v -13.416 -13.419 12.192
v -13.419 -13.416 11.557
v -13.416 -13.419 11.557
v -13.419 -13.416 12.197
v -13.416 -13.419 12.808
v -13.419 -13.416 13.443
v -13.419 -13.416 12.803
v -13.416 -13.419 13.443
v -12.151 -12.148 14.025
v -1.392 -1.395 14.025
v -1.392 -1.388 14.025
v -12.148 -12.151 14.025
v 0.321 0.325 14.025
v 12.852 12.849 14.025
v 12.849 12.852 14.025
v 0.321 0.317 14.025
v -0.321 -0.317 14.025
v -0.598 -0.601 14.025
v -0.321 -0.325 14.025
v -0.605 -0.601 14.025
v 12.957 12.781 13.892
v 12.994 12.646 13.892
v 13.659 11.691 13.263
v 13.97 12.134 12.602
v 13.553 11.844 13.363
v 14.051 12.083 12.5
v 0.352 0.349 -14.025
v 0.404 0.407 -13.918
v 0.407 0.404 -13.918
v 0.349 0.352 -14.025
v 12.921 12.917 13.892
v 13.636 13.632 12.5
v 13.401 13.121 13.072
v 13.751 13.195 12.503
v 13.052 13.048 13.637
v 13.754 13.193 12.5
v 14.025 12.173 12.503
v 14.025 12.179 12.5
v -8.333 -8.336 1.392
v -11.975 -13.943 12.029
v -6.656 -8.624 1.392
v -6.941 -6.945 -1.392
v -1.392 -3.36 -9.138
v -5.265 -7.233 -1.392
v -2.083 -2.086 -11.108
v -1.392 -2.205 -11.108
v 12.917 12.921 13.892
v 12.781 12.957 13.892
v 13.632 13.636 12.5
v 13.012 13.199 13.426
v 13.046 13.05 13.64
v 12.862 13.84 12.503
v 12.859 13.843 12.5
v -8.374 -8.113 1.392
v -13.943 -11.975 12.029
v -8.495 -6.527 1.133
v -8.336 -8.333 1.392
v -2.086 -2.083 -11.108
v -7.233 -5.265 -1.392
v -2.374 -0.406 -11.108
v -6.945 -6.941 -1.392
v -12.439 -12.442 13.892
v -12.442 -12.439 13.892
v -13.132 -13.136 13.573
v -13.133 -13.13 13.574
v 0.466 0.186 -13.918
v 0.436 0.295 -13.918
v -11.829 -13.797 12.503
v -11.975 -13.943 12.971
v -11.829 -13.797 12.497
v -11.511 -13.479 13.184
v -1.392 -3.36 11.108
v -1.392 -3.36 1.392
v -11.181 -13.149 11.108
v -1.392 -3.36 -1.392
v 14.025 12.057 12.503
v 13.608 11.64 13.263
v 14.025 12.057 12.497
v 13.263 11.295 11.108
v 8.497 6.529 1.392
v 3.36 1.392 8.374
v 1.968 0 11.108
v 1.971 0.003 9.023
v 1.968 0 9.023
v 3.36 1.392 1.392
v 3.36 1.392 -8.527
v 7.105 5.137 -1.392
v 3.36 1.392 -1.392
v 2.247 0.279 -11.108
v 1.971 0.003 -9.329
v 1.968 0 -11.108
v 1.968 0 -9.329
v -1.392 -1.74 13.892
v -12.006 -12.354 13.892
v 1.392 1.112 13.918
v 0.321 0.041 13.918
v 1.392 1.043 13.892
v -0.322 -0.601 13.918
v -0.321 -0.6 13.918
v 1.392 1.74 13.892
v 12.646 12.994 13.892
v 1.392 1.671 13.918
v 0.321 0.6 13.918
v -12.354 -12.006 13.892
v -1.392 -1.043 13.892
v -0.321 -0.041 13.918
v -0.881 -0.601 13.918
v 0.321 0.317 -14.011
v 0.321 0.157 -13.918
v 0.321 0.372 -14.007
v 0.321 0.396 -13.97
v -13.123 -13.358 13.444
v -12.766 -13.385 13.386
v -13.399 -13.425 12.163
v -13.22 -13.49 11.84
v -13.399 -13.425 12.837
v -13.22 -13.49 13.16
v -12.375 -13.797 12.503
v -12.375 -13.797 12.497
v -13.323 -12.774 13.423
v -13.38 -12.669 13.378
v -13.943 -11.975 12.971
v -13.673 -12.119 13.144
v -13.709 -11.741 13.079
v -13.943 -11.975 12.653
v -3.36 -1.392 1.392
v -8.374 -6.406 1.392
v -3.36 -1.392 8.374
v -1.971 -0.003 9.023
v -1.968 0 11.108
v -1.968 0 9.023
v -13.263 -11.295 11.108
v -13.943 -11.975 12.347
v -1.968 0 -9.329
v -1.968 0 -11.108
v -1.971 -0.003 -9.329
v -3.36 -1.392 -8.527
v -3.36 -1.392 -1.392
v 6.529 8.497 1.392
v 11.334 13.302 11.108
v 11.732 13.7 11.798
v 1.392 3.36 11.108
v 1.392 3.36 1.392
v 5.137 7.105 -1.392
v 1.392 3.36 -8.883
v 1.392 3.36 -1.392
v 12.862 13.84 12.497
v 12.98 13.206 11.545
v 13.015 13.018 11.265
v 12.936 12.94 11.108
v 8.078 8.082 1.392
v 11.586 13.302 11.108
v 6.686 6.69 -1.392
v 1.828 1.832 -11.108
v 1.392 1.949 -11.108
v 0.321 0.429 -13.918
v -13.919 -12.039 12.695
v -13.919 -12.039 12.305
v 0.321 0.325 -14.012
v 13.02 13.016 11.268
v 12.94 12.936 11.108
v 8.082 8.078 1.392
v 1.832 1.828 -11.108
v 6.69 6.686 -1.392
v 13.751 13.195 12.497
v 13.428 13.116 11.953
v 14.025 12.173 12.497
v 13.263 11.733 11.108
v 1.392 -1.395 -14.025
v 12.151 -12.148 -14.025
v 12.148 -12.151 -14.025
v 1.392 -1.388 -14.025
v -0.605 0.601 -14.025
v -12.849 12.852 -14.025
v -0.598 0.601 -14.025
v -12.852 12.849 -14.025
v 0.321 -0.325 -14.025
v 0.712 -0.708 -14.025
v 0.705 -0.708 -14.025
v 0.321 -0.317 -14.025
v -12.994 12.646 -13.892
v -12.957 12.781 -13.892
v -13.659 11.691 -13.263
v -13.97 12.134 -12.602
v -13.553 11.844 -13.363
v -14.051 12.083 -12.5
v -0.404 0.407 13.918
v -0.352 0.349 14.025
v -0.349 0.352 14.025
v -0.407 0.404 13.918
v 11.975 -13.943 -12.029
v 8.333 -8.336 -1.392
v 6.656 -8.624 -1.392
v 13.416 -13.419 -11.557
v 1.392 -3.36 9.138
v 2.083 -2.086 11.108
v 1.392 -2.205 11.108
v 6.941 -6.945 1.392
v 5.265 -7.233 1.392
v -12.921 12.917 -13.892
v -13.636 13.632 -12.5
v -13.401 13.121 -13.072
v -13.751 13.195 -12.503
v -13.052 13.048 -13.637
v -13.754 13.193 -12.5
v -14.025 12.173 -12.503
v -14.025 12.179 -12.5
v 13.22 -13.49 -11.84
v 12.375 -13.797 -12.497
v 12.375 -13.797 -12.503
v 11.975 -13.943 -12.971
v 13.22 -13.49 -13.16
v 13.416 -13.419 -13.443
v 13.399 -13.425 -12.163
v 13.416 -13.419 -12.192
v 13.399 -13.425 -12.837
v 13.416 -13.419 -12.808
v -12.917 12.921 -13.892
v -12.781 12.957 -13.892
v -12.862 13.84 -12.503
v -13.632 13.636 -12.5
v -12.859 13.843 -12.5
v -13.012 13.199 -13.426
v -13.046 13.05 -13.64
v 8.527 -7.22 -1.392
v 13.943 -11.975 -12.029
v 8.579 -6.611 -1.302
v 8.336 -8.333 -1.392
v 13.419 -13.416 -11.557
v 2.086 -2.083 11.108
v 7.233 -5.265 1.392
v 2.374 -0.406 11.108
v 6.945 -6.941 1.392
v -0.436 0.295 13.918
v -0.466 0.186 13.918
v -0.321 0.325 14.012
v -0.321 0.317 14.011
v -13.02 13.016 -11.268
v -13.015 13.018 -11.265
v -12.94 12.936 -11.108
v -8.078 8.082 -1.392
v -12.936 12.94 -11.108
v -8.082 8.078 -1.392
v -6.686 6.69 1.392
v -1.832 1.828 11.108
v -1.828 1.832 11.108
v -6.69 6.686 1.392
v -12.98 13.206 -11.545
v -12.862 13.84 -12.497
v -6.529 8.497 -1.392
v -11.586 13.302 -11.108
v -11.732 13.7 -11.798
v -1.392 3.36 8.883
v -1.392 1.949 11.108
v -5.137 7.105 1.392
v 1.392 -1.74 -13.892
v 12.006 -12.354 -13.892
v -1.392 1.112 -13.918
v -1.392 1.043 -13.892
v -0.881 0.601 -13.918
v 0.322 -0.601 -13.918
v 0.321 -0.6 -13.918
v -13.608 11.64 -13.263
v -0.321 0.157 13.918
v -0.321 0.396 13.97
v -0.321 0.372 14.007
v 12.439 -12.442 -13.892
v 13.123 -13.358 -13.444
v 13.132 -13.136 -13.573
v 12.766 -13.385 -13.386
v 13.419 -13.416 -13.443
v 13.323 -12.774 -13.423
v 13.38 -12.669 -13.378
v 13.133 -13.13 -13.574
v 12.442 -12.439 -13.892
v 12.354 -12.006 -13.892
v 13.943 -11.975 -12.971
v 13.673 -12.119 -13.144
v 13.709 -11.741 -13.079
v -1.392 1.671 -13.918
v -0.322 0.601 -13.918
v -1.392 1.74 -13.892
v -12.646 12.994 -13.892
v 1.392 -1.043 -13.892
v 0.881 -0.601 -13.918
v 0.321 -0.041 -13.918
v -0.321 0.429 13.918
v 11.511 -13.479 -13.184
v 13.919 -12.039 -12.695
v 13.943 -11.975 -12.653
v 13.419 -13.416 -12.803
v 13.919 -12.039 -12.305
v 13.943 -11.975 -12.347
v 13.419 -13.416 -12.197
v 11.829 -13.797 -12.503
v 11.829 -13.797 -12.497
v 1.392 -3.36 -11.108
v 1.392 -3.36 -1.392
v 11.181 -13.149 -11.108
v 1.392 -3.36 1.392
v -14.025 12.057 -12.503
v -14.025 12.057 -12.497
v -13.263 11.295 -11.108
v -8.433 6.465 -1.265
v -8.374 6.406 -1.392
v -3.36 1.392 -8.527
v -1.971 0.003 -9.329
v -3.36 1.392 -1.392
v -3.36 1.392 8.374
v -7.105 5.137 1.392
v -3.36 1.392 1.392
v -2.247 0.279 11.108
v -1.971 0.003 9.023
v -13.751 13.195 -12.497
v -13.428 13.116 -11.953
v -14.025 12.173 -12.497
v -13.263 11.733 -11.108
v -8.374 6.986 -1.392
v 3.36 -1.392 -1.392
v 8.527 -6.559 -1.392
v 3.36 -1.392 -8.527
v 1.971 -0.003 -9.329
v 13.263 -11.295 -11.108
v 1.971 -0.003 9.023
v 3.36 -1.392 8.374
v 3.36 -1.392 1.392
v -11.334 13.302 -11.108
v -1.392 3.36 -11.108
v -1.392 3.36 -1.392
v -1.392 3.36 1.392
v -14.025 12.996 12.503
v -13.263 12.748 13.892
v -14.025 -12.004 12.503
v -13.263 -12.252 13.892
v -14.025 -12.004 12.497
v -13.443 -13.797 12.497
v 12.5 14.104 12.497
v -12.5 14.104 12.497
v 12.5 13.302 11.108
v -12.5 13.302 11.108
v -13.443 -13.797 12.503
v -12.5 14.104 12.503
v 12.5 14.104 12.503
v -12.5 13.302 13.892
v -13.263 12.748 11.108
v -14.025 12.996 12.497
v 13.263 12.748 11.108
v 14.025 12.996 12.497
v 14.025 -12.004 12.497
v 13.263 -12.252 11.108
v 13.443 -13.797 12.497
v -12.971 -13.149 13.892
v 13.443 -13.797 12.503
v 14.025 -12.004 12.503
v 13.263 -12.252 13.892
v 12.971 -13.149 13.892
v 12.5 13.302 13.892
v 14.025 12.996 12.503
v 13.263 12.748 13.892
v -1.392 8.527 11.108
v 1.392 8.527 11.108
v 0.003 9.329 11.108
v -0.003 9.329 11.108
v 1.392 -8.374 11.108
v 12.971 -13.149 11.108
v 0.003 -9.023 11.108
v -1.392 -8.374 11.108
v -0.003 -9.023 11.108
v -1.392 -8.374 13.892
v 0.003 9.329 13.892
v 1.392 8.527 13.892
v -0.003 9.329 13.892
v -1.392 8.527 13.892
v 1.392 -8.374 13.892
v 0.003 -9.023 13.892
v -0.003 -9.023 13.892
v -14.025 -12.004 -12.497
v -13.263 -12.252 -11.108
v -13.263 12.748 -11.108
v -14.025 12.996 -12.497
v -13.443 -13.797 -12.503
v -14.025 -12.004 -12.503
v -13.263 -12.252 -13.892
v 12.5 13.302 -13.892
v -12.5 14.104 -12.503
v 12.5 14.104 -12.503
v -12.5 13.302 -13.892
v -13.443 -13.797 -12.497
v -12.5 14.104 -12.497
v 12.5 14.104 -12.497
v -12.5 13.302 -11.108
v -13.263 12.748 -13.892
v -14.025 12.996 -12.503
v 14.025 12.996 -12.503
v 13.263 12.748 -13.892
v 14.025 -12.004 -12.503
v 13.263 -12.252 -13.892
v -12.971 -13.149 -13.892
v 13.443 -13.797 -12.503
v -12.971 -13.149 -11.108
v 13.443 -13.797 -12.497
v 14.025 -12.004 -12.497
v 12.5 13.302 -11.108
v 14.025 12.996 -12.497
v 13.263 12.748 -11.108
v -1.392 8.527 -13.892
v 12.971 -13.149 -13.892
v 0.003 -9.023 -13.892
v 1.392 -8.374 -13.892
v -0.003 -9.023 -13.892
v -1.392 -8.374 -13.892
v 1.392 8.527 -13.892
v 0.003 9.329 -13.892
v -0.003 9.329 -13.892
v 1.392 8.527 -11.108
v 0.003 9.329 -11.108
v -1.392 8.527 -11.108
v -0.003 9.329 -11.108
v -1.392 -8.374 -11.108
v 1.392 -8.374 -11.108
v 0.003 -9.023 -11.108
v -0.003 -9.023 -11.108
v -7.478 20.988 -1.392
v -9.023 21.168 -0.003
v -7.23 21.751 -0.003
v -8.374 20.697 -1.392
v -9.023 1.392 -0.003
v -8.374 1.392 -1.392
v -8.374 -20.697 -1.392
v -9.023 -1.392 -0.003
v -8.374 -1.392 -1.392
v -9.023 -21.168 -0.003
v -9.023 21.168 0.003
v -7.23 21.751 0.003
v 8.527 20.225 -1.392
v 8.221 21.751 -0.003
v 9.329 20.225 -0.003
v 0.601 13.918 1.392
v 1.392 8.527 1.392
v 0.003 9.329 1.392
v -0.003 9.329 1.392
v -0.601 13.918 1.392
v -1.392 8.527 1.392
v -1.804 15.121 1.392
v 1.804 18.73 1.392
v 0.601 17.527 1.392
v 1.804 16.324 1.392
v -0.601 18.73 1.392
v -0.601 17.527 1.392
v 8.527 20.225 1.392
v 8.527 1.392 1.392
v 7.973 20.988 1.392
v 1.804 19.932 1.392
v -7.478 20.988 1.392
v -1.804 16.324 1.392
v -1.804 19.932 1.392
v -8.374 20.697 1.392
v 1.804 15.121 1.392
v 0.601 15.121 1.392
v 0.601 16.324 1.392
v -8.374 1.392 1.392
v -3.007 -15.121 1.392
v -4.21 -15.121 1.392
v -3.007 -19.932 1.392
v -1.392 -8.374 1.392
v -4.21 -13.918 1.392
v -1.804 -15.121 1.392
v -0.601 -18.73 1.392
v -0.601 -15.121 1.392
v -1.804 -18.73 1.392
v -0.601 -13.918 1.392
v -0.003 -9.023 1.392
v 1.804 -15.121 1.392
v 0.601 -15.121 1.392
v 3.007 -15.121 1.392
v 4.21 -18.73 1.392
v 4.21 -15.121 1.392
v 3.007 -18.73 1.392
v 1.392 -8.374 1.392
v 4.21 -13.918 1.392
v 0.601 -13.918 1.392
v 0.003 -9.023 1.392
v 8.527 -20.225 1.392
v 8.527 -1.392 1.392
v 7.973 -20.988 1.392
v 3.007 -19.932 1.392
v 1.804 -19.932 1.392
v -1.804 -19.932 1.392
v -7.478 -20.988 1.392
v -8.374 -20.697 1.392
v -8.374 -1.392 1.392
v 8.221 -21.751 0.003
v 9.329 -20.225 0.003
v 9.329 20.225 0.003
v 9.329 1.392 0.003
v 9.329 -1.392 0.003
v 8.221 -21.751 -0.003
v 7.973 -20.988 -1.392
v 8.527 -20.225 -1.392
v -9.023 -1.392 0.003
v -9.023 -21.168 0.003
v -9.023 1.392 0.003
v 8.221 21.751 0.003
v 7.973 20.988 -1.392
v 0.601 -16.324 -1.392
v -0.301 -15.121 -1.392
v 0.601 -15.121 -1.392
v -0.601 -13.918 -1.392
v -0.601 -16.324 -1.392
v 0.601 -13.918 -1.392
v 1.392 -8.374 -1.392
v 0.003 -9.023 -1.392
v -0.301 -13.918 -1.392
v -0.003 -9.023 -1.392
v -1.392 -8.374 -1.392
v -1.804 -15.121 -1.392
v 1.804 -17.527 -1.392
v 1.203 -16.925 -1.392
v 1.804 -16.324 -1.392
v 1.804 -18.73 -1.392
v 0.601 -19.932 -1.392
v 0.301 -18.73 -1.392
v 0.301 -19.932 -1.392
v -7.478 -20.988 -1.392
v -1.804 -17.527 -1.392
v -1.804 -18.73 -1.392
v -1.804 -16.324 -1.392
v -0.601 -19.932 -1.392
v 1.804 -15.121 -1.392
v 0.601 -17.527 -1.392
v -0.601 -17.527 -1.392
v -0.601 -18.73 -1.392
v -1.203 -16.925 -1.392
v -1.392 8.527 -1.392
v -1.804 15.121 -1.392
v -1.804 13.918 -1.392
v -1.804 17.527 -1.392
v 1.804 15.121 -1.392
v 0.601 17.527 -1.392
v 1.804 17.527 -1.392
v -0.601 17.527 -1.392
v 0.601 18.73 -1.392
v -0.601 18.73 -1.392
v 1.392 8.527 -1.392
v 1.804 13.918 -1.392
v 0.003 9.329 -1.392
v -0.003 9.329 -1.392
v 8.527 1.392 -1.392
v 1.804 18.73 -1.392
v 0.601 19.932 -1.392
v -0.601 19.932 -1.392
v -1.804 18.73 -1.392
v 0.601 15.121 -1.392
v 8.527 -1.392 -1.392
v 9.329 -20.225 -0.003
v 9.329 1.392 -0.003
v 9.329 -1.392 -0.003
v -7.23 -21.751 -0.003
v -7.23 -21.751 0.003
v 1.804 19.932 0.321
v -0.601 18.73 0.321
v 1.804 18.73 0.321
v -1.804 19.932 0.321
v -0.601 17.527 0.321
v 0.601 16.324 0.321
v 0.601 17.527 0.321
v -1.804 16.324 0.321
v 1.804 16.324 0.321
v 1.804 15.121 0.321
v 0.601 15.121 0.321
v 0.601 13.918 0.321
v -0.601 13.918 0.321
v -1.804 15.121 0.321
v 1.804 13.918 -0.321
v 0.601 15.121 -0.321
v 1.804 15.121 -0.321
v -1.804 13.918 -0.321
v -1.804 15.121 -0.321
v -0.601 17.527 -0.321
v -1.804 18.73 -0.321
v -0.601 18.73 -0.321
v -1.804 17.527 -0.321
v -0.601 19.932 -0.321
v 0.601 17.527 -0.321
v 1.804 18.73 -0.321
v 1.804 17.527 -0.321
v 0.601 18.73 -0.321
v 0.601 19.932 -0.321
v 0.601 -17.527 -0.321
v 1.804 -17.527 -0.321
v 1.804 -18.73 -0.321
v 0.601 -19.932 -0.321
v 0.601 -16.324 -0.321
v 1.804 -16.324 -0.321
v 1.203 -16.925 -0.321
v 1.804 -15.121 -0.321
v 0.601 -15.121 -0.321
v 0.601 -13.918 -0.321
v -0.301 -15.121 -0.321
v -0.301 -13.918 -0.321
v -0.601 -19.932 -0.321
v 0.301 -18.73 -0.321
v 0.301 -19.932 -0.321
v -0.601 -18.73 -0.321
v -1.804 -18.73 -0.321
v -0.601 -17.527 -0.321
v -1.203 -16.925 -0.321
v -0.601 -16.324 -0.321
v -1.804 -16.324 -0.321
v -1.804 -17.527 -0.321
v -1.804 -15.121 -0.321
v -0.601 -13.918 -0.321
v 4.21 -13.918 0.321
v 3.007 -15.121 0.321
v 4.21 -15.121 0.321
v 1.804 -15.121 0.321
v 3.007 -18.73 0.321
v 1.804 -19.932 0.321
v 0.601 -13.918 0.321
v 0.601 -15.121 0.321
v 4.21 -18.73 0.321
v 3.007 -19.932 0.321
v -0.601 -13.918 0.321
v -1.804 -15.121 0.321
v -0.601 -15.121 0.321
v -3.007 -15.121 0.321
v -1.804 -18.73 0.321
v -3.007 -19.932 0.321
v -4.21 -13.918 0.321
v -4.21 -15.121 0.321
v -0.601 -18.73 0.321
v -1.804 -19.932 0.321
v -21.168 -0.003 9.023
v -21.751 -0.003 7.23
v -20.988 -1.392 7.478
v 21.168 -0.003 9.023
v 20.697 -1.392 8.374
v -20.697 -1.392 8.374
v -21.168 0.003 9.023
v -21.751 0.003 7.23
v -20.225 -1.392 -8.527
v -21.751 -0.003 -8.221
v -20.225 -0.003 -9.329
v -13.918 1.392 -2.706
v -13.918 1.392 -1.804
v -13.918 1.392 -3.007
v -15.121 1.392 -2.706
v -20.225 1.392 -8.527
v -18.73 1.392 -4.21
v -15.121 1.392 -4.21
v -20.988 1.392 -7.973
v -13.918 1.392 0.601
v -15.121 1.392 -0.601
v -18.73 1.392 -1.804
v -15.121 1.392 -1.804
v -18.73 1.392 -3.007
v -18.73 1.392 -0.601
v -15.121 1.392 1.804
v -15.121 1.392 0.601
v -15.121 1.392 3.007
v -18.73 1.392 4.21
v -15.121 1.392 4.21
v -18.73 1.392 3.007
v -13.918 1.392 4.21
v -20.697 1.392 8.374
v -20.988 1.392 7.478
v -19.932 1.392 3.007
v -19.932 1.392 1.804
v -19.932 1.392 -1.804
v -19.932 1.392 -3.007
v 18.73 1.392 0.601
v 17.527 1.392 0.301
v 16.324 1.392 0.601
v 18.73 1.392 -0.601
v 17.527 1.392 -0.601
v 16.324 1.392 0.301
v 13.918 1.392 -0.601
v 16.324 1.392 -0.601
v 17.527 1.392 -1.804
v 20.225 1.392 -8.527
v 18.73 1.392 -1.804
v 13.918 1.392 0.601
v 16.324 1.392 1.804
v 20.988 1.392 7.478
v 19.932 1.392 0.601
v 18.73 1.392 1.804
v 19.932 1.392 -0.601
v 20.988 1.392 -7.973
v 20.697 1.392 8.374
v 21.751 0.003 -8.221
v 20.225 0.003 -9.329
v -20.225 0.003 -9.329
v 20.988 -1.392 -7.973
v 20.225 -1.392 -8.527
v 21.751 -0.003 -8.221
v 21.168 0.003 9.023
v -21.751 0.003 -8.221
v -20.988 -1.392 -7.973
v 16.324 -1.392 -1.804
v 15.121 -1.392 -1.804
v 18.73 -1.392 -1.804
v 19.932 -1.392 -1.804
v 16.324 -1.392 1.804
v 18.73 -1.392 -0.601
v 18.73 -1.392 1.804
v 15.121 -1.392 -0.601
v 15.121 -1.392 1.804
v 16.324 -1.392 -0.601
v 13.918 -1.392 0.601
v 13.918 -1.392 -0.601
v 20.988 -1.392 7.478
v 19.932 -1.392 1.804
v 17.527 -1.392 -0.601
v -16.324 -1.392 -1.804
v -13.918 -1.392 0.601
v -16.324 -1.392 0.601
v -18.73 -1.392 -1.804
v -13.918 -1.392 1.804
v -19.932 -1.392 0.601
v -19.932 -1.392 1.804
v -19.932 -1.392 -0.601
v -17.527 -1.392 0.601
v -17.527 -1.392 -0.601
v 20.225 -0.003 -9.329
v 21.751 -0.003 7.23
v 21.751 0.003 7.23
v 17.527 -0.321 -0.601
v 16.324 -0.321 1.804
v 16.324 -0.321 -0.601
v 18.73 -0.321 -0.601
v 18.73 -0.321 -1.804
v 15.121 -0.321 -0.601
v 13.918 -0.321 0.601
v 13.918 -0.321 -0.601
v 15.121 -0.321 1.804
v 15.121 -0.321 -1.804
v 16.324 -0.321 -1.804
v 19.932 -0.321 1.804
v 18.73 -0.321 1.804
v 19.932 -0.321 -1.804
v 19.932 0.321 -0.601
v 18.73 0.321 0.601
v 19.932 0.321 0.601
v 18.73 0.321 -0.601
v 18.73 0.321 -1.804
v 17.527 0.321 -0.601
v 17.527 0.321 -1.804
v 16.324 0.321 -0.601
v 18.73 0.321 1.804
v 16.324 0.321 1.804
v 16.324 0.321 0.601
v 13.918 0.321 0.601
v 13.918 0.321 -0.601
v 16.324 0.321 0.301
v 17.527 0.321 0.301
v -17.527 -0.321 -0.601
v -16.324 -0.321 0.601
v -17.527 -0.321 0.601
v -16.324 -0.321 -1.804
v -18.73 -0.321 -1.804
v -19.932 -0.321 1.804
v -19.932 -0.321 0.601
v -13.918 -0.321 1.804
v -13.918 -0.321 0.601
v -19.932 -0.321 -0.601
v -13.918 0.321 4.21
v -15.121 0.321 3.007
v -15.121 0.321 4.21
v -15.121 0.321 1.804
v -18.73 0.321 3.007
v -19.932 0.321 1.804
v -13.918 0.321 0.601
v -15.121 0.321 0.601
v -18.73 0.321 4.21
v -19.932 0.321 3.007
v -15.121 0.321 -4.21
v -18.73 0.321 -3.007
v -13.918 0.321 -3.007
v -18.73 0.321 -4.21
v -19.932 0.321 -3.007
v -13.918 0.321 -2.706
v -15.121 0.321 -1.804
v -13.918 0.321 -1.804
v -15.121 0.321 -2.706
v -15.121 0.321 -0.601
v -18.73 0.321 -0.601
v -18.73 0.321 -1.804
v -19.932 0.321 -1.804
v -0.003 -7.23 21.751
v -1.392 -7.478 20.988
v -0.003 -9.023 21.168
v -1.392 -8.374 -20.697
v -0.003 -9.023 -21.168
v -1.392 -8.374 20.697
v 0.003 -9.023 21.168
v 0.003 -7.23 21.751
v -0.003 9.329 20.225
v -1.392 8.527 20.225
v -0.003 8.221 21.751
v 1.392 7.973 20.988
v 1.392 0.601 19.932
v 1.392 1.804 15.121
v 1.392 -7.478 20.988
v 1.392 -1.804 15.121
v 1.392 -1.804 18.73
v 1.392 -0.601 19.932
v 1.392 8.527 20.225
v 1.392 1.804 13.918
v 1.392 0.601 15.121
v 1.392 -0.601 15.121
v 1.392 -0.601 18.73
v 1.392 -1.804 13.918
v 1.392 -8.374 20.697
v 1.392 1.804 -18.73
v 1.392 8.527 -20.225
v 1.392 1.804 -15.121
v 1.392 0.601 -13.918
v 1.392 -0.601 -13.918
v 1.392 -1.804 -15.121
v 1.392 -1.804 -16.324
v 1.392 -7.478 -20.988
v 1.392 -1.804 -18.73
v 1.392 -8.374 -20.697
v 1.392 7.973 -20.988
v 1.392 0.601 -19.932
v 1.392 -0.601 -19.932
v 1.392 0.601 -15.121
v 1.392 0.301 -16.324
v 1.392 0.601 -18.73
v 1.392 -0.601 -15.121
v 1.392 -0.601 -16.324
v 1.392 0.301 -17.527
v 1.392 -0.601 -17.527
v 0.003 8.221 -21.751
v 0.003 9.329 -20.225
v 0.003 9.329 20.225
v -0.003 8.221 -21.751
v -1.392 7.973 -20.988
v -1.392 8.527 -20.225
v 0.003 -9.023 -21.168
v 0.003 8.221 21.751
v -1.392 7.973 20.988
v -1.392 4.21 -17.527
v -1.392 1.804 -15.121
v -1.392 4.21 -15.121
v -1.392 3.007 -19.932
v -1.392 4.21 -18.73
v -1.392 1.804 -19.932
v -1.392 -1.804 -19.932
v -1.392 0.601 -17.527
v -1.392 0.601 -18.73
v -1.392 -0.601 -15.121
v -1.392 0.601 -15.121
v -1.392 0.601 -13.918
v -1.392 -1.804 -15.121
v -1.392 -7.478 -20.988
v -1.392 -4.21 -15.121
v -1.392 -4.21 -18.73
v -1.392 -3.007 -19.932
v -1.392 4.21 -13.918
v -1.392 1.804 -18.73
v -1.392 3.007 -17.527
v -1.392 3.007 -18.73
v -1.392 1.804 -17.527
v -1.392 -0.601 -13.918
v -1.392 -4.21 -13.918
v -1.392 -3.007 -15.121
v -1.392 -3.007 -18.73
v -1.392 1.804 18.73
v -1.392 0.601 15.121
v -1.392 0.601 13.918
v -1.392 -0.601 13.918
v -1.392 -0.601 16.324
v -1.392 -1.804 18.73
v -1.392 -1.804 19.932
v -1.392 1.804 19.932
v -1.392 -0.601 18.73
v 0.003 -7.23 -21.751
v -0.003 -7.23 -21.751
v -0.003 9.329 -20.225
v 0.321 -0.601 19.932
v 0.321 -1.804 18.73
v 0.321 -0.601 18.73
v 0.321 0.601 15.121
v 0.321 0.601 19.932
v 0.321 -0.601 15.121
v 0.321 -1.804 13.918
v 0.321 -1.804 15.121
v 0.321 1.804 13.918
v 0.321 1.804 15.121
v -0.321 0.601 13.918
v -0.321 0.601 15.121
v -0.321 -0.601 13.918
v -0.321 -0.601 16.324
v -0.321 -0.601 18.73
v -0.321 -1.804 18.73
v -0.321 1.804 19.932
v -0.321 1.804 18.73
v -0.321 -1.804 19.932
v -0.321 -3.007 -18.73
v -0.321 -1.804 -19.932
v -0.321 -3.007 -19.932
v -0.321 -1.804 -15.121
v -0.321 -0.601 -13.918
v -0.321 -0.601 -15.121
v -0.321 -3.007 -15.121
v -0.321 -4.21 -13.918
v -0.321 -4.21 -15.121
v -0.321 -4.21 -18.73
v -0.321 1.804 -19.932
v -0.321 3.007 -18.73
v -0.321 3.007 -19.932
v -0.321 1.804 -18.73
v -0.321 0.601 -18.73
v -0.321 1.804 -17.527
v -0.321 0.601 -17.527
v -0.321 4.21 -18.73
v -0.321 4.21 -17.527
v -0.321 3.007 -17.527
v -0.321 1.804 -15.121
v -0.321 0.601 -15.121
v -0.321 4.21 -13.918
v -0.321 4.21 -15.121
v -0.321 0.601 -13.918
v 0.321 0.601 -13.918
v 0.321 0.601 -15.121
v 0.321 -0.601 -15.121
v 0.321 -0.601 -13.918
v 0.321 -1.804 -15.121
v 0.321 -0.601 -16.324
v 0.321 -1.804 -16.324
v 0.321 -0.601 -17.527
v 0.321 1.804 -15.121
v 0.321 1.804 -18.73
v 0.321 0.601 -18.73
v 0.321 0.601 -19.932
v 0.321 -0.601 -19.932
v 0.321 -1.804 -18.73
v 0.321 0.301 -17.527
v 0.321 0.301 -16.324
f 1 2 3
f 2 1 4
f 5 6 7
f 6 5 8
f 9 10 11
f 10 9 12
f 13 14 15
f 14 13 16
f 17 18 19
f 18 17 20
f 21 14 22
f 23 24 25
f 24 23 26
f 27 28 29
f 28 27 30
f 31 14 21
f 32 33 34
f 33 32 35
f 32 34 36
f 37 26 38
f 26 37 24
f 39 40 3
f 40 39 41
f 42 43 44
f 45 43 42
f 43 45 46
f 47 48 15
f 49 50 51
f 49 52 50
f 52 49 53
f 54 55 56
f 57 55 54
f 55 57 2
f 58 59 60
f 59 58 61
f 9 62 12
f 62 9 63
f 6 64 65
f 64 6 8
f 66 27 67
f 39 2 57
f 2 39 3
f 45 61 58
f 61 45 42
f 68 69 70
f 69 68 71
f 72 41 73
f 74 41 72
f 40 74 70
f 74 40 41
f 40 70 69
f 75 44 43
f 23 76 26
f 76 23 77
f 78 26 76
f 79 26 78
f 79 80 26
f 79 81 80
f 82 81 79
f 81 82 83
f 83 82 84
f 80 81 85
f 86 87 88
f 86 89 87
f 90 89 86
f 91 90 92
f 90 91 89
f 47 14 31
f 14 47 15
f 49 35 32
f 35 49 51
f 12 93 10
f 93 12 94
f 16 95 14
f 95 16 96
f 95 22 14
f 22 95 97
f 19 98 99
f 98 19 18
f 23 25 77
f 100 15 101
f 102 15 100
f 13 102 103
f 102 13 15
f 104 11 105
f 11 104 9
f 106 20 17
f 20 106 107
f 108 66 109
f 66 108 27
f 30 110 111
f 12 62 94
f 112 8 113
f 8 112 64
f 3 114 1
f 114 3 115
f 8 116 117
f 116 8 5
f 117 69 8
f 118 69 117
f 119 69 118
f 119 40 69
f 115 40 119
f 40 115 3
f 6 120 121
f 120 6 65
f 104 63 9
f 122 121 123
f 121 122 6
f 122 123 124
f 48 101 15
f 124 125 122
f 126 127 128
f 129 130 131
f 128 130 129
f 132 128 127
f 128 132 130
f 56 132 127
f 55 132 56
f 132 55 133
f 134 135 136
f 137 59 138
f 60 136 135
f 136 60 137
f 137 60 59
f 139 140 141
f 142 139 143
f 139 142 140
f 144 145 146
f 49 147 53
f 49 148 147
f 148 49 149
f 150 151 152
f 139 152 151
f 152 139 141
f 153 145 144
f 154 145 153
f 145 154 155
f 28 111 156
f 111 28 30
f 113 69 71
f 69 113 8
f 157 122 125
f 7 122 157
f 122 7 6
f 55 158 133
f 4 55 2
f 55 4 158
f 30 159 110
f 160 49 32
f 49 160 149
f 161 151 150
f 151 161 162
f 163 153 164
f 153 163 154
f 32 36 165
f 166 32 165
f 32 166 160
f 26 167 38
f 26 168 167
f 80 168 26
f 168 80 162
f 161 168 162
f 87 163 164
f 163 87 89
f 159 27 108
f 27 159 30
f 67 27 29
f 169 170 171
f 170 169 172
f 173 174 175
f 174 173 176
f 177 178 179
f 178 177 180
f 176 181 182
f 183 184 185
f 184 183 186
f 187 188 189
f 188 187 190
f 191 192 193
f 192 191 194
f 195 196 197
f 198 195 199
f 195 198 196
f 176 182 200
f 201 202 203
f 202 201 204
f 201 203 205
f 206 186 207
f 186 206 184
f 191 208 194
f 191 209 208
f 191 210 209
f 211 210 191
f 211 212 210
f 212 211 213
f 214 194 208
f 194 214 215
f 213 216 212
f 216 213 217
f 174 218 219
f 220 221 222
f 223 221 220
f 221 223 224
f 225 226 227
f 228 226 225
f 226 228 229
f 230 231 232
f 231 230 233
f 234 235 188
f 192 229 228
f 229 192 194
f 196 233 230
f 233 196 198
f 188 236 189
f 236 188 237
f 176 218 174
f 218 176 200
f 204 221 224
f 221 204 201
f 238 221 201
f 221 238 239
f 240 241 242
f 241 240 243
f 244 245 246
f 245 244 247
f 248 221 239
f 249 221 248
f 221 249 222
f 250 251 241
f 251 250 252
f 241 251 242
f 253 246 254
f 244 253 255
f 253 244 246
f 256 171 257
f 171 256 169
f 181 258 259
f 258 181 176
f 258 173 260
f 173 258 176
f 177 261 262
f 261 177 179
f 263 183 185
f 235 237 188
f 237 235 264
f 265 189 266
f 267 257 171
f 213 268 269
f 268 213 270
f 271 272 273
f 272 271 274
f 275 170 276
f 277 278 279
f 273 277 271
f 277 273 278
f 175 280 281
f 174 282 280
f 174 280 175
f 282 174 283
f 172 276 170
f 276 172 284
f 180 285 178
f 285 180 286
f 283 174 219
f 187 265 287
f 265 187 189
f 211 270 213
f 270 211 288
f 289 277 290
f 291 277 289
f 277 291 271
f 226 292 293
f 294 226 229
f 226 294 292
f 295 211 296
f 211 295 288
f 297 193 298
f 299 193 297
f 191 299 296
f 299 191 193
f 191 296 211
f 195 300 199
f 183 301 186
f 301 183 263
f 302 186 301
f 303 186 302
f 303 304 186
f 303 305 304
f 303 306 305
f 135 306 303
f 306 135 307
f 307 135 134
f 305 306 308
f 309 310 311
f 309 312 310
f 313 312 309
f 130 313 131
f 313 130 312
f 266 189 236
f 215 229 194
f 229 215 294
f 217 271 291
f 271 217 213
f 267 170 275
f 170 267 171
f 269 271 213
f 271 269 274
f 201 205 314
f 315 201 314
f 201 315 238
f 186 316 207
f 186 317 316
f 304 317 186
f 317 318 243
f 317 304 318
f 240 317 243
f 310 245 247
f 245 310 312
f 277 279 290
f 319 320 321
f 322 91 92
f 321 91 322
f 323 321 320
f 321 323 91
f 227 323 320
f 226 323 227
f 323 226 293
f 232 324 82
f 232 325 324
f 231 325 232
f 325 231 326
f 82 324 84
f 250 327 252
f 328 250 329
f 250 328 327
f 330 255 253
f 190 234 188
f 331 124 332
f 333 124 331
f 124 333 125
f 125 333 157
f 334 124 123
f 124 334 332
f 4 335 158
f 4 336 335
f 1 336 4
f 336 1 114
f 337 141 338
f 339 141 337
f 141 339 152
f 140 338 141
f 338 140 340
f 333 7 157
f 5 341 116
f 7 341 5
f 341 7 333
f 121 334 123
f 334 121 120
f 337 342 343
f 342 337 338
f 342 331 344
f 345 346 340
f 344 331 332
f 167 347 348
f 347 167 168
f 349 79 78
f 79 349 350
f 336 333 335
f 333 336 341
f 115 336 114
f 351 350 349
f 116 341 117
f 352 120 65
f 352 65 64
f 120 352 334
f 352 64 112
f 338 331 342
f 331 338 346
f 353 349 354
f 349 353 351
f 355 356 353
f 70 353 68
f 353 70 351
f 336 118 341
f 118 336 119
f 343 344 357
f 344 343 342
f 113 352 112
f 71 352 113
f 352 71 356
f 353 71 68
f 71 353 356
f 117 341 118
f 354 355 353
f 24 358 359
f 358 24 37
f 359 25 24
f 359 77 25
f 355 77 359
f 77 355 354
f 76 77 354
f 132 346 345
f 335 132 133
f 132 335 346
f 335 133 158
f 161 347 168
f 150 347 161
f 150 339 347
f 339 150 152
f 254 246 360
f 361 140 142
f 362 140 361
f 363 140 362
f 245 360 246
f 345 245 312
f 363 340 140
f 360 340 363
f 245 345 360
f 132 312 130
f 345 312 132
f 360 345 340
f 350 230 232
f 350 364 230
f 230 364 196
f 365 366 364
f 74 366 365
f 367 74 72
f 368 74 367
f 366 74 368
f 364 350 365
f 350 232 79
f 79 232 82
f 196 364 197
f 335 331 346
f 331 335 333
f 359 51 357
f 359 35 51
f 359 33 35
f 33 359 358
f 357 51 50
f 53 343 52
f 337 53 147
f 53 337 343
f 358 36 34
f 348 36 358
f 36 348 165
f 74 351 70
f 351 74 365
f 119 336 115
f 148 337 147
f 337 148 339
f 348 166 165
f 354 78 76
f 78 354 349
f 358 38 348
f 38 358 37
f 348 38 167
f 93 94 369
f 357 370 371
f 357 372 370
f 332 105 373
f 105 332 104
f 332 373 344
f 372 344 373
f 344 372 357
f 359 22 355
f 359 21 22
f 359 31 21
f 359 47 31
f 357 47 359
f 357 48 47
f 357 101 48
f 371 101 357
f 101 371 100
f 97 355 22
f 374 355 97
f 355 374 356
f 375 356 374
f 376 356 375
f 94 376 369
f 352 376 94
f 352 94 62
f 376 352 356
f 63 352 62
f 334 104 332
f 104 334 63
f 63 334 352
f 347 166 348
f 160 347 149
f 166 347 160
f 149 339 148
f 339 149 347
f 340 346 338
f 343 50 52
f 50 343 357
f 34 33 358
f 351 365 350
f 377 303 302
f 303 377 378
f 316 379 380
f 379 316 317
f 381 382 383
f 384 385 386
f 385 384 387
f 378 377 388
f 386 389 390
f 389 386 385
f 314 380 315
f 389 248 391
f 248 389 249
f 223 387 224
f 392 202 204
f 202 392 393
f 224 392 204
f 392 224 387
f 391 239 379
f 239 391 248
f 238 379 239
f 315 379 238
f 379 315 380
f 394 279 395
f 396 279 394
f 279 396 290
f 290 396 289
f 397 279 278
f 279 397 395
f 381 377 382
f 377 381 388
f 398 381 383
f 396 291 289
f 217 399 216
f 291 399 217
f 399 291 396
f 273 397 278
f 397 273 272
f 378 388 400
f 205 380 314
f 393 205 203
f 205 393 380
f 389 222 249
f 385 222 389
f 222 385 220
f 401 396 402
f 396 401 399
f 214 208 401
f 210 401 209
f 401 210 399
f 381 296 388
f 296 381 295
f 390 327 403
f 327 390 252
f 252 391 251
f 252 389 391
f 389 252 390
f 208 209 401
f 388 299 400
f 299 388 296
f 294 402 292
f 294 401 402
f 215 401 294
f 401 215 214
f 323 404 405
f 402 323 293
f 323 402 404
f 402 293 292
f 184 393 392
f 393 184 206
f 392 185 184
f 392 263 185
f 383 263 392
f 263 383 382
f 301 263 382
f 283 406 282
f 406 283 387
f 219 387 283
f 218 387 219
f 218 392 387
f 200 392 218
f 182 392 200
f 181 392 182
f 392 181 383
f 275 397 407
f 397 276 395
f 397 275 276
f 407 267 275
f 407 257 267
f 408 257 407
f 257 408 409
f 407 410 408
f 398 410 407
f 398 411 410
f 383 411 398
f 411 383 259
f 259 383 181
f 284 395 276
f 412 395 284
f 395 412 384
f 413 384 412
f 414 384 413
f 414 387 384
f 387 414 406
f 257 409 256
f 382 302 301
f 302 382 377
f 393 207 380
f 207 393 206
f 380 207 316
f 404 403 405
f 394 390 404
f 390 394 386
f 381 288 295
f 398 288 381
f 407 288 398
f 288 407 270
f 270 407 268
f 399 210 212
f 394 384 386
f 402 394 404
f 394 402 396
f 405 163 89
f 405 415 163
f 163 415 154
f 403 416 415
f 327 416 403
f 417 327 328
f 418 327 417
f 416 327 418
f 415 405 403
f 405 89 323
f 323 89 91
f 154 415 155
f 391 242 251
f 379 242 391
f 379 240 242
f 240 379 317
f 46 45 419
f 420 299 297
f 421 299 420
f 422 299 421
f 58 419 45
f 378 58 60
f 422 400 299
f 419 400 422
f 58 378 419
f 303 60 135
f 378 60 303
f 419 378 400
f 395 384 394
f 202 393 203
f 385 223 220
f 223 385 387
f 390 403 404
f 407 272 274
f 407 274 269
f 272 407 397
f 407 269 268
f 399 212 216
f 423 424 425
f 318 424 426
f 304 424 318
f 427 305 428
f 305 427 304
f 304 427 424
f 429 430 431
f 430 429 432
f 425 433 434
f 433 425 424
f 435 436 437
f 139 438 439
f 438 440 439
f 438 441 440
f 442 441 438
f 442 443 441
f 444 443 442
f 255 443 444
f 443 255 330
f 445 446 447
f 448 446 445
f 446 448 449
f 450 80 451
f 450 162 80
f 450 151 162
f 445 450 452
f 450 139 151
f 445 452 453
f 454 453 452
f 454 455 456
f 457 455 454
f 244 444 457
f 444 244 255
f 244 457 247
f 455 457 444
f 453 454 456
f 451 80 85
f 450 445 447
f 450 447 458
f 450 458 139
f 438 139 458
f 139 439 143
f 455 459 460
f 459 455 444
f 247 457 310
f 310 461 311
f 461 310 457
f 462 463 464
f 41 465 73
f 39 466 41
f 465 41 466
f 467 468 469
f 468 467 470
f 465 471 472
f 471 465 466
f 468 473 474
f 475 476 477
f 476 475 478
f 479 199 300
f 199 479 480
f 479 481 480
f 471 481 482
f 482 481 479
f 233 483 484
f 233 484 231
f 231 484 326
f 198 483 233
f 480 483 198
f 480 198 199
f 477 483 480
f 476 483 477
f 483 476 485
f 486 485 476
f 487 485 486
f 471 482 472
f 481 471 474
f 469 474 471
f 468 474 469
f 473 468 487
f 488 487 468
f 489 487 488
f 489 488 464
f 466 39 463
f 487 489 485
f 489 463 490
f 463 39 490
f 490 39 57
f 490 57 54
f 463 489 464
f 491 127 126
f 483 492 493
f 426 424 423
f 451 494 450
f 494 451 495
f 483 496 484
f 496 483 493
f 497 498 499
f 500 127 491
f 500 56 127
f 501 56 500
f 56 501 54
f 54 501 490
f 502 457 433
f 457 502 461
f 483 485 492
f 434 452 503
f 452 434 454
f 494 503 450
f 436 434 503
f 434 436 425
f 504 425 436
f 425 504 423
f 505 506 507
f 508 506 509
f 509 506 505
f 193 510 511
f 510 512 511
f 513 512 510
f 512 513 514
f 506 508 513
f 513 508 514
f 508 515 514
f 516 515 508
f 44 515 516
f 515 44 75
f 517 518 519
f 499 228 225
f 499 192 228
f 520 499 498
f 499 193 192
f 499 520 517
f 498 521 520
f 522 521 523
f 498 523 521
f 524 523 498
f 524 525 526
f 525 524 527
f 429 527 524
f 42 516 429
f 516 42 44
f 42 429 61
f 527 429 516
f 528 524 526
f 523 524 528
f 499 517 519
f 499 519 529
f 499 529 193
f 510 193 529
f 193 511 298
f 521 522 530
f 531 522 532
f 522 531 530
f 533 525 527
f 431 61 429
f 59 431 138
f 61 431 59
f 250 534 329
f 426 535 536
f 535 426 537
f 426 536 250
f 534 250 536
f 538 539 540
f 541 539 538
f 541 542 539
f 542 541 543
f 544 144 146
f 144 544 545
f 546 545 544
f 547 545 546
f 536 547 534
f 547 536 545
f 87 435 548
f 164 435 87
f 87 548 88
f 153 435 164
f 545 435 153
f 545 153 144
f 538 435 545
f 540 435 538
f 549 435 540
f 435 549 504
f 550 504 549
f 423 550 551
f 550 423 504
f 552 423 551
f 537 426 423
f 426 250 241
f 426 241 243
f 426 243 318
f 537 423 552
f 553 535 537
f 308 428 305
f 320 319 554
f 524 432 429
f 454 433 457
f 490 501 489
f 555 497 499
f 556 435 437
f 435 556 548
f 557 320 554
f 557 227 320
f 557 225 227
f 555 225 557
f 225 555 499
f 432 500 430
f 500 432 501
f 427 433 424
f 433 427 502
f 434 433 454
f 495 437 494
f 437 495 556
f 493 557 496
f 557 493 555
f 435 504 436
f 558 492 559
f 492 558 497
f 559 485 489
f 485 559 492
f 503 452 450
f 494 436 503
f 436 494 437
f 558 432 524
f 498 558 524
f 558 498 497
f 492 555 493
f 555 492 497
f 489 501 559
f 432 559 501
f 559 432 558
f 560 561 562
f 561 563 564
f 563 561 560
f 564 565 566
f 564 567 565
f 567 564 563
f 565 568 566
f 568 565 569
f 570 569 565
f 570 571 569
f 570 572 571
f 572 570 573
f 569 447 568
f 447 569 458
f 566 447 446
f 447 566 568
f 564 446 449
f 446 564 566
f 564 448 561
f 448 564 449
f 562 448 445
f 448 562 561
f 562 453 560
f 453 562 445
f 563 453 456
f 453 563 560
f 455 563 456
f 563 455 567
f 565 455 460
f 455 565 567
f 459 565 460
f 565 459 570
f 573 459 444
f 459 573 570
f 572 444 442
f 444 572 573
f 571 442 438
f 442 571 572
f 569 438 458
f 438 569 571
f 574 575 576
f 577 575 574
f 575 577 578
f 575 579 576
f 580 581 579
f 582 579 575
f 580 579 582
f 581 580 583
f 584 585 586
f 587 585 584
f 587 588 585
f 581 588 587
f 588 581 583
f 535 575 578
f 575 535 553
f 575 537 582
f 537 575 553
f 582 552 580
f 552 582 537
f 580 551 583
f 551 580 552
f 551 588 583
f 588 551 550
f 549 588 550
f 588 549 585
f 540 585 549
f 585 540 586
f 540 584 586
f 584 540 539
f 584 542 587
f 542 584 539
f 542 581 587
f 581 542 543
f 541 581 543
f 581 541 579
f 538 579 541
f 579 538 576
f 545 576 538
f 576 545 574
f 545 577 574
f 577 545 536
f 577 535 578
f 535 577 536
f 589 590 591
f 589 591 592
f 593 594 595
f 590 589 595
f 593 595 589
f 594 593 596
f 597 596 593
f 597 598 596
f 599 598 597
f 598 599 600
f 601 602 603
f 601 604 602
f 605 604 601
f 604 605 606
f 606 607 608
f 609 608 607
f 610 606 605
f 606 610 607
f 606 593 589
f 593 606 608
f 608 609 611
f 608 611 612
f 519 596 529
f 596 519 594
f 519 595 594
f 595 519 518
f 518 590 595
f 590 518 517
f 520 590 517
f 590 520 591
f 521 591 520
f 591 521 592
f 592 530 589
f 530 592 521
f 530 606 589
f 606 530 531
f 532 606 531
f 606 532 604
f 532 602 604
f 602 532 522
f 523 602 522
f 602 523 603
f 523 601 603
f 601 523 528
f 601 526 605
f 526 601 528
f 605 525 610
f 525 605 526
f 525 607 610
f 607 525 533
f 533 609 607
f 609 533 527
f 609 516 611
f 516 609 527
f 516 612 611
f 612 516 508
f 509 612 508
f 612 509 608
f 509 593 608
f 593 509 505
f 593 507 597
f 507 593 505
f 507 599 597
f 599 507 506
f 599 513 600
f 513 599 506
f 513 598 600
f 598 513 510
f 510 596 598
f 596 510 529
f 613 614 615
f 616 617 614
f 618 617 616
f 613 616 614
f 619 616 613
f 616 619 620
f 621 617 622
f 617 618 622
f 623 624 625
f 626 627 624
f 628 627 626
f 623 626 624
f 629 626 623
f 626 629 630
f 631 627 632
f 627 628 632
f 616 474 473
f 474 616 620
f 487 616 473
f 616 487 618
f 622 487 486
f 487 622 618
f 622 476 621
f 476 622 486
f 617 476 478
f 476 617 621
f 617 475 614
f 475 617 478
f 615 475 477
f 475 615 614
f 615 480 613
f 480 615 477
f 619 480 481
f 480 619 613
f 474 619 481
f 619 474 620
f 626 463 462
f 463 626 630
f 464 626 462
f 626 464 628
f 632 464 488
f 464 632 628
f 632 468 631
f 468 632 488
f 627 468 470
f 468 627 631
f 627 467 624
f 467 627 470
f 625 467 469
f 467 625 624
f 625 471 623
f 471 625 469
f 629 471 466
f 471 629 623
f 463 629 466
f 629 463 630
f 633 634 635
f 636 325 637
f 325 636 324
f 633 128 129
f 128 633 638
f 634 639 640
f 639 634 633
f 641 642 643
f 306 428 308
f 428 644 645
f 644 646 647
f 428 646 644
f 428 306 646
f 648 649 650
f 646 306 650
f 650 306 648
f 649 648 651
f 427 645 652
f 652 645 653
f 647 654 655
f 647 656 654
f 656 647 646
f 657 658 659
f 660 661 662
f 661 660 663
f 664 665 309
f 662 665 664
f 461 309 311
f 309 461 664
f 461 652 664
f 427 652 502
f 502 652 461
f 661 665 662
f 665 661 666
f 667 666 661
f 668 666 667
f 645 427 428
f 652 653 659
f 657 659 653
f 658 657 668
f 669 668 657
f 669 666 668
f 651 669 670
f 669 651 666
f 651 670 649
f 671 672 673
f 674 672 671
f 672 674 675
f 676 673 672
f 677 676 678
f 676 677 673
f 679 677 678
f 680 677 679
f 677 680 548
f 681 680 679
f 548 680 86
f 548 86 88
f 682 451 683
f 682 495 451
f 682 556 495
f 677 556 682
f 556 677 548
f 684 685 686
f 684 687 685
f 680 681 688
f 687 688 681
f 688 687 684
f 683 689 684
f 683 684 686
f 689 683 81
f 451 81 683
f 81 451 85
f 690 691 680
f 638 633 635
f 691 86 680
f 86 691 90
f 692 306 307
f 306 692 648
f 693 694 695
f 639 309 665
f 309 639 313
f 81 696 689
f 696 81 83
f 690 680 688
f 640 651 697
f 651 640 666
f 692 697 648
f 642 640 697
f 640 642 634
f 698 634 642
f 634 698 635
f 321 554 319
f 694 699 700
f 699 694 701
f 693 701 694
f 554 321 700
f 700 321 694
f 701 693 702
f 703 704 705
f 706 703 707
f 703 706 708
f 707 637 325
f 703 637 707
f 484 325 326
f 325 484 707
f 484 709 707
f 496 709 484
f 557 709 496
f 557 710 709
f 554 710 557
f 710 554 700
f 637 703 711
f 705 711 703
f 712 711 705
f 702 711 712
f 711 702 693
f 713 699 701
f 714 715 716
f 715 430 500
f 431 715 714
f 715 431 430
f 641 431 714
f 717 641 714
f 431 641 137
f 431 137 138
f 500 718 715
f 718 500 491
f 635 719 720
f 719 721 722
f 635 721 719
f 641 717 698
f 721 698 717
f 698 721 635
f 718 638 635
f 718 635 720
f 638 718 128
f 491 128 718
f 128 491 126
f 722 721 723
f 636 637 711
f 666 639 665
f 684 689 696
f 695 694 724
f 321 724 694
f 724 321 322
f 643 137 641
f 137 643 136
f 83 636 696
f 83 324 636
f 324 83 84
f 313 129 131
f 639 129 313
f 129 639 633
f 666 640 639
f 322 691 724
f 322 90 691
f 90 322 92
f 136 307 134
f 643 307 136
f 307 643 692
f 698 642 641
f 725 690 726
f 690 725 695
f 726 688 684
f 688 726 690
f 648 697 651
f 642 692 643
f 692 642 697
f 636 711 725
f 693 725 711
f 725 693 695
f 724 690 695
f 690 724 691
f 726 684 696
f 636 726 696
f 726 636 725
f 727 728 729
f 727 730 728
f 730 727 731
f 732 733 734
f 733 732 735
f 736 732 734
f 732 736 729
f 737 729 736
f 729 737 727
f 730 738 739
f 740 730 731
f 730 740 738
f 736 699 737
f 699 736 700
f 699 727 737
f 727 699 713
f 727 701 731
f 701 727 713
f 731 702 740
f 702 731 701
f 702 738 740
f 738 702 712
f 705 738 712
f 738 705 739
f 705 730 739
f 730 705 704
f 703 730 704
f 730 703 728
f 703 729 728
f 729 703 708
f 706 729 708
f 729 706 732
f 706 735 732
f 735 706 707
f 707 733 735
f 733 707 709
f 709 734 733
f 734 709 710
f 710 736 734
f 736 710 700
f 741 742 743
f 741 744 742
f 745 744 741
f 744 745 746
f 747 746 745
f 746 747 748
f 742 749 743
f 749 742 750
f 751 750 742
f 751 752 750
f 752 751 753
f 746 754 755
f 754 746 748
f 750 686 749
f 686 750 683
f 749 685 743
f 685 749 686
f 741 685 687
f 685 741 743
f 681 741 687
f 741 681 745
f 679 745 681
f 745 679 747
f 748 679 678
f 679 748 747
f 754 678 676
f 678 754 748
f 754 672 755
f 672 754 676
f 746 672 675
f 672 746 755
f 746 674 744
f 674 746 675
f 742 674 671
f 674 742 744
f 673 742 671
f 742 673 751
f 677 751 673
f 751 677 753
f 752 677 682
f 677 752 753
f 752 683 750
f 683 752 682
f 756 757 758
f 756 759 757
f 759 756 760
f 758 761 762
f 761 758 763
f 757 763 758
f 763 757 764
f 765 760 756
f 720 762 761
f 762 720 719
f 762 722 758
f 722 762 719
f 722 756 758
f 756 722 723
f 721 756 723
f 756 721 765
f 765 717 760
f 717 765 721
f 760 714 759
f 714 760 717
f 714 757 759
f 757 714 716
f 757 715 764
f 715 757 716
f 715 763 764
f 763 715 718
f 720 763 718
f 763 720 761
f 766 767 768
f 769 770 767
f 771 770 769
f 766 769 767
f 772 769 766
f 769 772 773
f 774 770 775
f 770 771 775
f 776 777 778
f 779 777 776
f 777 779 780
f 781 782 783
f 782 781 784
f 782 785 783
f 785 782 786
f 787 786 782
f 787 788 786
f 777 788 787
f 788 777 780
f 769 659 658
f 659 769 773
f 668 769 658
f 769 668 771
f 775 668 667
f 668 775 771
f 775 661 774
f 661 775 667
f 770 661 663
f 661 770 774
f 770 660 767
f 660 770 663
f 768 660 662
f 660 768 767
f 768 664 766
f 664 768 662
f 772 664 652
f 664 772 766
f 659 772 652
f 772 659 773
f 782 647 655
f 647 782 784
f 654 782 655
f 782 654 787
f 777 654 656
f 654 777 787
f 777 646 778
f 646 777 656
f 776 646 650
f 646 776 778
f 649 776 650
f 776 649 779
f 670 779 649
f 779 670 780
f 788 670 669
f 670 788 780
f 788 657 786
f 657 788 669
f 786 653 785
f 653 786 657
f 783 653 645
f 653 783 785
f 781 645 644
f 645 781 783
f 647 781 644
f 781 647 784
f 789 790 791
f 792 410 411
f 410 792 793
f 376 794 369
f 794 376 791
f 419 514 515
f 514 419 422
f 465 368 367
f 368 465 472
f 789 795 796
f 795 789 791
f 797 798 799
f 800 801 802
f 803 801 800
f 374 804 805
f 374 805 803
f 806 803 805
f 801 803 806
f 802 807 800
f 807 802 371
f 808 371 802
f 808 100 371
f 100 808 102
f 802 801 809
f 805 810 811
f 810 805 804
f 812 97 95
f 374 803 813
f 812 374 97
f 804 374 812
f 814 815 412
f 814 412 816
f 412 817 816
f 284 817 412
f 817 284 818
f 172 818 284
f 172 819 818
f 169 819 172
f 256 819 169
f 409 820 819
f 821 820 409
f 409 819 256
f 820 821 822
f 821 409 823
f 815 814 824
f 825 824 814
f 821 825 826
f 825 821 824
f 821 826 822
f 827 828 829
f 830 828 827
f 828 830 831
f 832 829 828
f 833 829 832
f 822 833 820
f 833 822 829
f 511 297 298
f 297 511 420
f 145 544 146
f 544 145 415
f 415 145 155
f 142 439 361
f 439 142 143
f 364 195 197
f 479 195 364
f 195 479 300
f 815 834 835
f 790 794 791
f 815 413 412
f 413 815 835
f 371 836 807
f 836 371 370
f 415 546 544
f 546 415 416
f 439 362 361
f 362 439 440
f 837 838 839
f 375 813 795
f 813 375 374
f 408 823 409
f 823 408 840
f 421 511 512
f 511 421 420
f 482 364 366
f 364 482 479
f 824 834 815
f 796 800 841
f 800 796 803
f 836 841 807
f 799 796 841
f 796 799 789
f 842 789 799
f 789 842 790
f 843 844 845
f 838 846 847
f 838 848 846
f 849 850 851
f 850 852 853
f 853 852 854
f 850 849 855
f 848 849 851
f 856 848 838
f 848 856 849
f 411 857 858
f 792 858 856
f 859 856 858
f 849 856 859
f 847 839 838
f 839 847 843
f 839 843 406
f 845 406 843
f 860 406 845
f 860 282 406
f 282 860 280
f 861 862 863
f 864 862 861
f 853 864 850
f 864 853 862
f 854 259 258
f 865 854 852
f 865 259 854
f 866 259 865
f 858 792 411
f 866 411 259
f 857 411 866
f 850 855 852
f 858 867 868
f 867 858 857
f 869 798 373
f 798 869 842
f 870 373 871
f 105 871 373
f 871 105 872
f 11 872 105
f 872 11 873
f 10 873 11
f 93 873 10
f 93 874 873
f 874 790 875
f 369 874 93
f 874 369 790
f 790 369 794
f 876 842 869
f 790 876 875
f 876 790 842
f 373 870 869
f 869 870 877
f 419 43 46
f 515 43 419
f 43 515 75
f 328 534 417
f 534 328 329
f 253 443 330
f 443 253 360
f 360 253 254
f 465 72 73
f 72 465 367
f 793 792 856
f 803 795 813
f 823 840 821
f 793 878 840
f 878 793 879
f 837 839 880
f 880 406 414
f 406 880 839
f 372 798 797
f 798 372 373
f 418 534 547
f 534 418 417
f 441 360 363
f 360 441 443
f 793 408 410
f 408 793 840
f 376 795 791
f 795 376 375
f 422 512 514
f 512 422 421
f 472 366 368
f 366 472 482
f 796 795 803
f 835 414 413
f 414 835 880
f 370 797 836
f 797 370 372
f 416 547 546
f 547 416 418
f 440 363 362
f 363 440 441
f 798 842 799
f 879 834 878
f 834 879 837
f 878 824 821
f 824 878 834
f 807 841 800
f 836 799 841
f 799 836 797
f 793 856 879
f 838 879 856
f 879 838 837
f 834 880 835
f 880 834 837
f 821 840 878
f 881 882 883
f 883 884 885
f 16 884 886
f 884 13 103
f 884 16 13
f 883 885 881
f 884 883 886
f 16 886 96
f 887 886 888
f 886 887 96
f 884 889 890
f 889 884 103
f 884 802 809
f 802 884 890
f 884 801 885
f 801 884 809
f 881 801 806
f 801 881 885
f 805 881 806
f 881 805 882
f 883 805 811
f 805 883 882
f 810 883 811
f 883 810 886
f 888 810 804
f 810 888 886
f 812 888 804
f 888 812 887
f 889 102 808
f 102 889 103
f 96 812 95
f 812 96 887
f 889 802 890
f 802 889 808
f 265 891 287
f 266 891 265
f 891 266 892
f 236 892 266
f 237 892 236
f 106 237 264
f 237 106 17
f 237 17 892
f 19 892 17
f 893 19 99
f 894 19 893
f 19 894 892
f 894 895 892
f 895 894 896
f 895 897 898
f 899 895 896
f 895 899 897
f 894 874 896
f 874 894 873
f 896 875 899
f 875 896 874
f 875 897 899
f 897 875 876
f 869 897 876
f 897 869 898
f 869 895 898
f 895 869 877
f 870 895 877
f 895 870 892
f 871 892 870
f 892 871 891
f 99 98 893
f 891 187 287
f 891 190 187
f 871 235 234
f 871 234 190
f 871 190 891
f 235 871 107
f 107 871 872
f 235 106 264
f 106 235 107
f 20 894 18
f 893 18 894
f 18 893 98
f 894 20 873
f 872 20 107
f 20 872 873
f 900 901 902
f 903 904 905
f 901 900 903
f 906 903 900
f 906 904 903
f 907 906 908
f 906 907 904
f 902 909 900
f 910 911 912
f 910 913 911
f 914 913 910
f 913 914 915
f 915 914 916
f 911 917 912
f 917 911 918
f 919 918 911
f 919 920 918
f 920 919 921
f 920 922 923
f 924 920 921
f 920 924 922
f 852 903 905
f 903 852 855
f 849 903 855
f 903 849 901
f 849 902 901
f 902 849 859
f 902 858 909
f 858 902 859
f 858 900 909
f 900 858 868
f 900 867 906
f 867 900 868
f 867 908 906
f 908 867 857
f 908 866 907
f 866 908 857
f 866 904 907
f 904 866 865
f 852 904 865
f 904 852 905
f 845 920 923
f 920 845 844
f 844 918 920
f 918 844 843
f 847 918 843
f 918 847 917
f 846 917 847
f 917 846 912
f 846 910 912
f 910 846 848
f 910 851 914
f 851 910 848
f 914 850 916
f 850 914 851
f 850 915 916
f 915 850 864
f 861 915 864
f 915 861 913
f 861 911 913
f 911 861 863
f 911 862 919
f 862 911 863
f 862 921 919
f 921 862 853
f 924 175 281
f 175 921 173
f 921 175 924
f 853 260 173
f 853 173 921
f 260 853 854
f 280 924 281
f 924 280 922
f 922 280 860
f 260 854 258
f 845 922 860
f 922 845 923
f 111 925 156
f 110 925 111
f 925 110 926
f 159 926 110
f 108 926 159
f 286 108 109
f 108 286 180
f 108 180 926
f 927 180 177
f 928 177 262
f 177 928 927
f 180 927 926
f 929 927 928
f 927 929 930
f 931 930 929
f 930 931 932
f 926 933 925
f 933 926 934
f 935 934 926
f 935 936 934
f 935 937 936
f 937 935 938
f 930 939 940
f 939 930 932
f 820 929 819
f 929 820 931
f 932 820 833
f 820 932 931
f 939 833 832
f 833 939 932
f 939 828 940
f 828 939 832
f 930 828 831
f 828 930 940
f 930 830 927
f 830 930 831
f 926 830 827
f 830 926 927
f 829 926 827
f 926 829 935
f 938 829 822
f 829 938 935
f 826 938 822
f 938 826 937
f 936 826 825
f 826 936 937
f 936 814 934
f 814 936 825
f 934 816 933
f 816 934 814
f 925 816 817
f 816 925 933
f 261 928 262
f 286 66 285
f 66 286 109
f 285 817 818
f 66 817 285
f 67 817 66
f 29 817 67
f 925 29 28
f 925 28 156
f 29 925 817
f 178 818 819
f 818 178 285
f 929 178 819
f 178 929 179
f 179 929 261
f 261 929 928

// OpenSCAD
diameter = 25*sqrt(3);
plane_thickness = diameter/27;
halfplane_emboss = plane_thickness / 5;
center_emboss = plane_thickness * 4/7;

module plane(){
	minkowski(){
 		linear_extrude(height=plane_thickness /300, center=true){
			child(0);
		}
		sphere(plane_thickness, $fn = 5);
	}
}

module halfplane(){
        translate([0,0,halfplane_emboss]){
	    linear_extrude(height=plane_thickness, center=false){
		child(0);
	    }
	}
}




module place(dir, dist=9/28){
f = diameter/36;
echo(dir);
	rotate(dir){
	translate([0,diameter*dist,0]){
	halfplane(){
	scale([f,f,f]){
		translate([-1.5,0,0]){
			child(0);
		}
	}
	}
	}
	}
}

module tet_tri() {
	plane(){
		polygon(points=[
			[diameter * .5 * sqrt(2)/sqrt(3), diameter * .5 / sqrt(3)],
			[diameter * -.5 * sqrt(2)/sqrt(3), diameter * .5 / sqrt(3)],
			[0, diameter * -.5 / sqrt(3)]
		]);
	}
}

module hex_squ(){
	plane(){
		square([diameter / sqrt(3) ,diameter / sqrt(3)], center=true);
	}

}

module dod_rec(){
	plane(){
		square([diameter * side, diameter * side * phi * phi], center=true);
	}
}

one = [
	[0,0],[0,1],[1,1],[1,4],[0,4],[1,5],[2,5],[2,1],[3,1],[3,0]
];
two = [
	[0,0],[0,1],[2,3],[2,4],[1,4],[1,3],[0,3],[0,4],[1,5],[2,5],[3,4],[3,3],[1,1],[3,1],[3,0]
];
three = [
	[0,1],[2,1],[2,2],[0,2],[2,4],[0,4],[0,5],[3,5],[3,4],[2,3],[3,2],[3,1],[2,0],[1,0]
];
four = [
	[3,0],[2,0],[2,2],[0,2],[0,4],[1,5],[1,3],[2,3],[2,5],[3,5]
];
five = [
	[0,1],[2,1],[2,2],[0,2],[0,4],[0,5],[3,5],[3,4],[1,4],[1,3],[2,3],[3,2],[3,1],[2,0],[1,0]
];
six = [
	[0,1],[0,4,],[1,5,],[2,5,],[3,4],[1,4],[1,1],[2,1],[2,2],[1.25,2],[1.25,3],[2,3],[3,2],[3,1],[2,0],[1,0]
];
seven = [
	[1,0],[1,1],[2,4],[0,4],[0,5],[3,5],[3,4],[2,2],[2,0]
];
eight = [
	[0,1],[0,2],[.5,2.5],[0,3],[0,4],[1,5],[1.75,5],[1.75,4],[1,4],[1,3],[2,3],[2,5],[3,4],[3,3],[2.5,2.5],[3,2],[3,1],[2,0],[1.25,0],[1.25,1],[2,1],[2,2],[1,2],[1,0]
];
nine = [
	[1,0],[2,2],[2,4],[1,4],[1,3],[1.75,3],[1.75,2],[1,2],[0,3],[0,4],[1,5],[2,5],[3,4],[3,2],[2,0]
];

zero = [
	[0,1],[0,4],[1,5],[2,5],[3,4],[3,1],[2,0],[2,4],[1,4],[1,1],[1.75,1],[1.75,0],[1,0]
];


phi = (1 + sqrt(5)) / 2;
side = 1/sqrt(pow(phi,4) + 1);

color("", 0.95){
	rotate([90,0,45]){
		tet_tri();
	    rotate([0,90,180]) {
			tet_tri();
		}
		translate([0,diameter/(2*sqrt(3)),0]){
			rotate([90,45,0]){
		   		hex_squ();
			}
		}
		translate([0,-diameter/(2*sqrt(3)),0]){
			rotate([90,45,0]){
		   		hex_squ();
			}
		}
	}
	difference(){
		dod_rec();
		place([0,0,0]){ polygon(five);} 
		place([0,180,0]){ polygon(two);} 
		place([180,0,0]){ polygon(eight);} 
		place([180,180,0]){ 
			union() {
				translate([-2,0,0]){polygon(one);}
				translate([2,0,0]){polygon(one);}
			}
		} 
	}
	rotate([0,90,90]){ 
	difference(){
		dod_rec();
		place([180,0,0]){ polygon(three);} 
		place([180,180,0]){ polygon(nine);} 
		place([0,180,0]){ polygon(four);} 
		place([0,0,0]){ 
			union() {
				translate([-2,0,0]){polygon(one);}
				translate([2,0,0]){polygon(zero);}
			}
		} 
	}
	}
	rotate([90,0,90]){ 
	difference(){
		dod_rec();
		place([0,0,0]){ polygon(one);} 
		place([0,180,0]){ polygon(seven);} 
		place([180,0,0]){ 
			union() {
				translate([-2,0,0]){polygon(one);}
				translate([2,0,0]){polygon(two);}
			}
		} 
		place([180,180,0]){ polygon(six);} 
	}
	}
}
